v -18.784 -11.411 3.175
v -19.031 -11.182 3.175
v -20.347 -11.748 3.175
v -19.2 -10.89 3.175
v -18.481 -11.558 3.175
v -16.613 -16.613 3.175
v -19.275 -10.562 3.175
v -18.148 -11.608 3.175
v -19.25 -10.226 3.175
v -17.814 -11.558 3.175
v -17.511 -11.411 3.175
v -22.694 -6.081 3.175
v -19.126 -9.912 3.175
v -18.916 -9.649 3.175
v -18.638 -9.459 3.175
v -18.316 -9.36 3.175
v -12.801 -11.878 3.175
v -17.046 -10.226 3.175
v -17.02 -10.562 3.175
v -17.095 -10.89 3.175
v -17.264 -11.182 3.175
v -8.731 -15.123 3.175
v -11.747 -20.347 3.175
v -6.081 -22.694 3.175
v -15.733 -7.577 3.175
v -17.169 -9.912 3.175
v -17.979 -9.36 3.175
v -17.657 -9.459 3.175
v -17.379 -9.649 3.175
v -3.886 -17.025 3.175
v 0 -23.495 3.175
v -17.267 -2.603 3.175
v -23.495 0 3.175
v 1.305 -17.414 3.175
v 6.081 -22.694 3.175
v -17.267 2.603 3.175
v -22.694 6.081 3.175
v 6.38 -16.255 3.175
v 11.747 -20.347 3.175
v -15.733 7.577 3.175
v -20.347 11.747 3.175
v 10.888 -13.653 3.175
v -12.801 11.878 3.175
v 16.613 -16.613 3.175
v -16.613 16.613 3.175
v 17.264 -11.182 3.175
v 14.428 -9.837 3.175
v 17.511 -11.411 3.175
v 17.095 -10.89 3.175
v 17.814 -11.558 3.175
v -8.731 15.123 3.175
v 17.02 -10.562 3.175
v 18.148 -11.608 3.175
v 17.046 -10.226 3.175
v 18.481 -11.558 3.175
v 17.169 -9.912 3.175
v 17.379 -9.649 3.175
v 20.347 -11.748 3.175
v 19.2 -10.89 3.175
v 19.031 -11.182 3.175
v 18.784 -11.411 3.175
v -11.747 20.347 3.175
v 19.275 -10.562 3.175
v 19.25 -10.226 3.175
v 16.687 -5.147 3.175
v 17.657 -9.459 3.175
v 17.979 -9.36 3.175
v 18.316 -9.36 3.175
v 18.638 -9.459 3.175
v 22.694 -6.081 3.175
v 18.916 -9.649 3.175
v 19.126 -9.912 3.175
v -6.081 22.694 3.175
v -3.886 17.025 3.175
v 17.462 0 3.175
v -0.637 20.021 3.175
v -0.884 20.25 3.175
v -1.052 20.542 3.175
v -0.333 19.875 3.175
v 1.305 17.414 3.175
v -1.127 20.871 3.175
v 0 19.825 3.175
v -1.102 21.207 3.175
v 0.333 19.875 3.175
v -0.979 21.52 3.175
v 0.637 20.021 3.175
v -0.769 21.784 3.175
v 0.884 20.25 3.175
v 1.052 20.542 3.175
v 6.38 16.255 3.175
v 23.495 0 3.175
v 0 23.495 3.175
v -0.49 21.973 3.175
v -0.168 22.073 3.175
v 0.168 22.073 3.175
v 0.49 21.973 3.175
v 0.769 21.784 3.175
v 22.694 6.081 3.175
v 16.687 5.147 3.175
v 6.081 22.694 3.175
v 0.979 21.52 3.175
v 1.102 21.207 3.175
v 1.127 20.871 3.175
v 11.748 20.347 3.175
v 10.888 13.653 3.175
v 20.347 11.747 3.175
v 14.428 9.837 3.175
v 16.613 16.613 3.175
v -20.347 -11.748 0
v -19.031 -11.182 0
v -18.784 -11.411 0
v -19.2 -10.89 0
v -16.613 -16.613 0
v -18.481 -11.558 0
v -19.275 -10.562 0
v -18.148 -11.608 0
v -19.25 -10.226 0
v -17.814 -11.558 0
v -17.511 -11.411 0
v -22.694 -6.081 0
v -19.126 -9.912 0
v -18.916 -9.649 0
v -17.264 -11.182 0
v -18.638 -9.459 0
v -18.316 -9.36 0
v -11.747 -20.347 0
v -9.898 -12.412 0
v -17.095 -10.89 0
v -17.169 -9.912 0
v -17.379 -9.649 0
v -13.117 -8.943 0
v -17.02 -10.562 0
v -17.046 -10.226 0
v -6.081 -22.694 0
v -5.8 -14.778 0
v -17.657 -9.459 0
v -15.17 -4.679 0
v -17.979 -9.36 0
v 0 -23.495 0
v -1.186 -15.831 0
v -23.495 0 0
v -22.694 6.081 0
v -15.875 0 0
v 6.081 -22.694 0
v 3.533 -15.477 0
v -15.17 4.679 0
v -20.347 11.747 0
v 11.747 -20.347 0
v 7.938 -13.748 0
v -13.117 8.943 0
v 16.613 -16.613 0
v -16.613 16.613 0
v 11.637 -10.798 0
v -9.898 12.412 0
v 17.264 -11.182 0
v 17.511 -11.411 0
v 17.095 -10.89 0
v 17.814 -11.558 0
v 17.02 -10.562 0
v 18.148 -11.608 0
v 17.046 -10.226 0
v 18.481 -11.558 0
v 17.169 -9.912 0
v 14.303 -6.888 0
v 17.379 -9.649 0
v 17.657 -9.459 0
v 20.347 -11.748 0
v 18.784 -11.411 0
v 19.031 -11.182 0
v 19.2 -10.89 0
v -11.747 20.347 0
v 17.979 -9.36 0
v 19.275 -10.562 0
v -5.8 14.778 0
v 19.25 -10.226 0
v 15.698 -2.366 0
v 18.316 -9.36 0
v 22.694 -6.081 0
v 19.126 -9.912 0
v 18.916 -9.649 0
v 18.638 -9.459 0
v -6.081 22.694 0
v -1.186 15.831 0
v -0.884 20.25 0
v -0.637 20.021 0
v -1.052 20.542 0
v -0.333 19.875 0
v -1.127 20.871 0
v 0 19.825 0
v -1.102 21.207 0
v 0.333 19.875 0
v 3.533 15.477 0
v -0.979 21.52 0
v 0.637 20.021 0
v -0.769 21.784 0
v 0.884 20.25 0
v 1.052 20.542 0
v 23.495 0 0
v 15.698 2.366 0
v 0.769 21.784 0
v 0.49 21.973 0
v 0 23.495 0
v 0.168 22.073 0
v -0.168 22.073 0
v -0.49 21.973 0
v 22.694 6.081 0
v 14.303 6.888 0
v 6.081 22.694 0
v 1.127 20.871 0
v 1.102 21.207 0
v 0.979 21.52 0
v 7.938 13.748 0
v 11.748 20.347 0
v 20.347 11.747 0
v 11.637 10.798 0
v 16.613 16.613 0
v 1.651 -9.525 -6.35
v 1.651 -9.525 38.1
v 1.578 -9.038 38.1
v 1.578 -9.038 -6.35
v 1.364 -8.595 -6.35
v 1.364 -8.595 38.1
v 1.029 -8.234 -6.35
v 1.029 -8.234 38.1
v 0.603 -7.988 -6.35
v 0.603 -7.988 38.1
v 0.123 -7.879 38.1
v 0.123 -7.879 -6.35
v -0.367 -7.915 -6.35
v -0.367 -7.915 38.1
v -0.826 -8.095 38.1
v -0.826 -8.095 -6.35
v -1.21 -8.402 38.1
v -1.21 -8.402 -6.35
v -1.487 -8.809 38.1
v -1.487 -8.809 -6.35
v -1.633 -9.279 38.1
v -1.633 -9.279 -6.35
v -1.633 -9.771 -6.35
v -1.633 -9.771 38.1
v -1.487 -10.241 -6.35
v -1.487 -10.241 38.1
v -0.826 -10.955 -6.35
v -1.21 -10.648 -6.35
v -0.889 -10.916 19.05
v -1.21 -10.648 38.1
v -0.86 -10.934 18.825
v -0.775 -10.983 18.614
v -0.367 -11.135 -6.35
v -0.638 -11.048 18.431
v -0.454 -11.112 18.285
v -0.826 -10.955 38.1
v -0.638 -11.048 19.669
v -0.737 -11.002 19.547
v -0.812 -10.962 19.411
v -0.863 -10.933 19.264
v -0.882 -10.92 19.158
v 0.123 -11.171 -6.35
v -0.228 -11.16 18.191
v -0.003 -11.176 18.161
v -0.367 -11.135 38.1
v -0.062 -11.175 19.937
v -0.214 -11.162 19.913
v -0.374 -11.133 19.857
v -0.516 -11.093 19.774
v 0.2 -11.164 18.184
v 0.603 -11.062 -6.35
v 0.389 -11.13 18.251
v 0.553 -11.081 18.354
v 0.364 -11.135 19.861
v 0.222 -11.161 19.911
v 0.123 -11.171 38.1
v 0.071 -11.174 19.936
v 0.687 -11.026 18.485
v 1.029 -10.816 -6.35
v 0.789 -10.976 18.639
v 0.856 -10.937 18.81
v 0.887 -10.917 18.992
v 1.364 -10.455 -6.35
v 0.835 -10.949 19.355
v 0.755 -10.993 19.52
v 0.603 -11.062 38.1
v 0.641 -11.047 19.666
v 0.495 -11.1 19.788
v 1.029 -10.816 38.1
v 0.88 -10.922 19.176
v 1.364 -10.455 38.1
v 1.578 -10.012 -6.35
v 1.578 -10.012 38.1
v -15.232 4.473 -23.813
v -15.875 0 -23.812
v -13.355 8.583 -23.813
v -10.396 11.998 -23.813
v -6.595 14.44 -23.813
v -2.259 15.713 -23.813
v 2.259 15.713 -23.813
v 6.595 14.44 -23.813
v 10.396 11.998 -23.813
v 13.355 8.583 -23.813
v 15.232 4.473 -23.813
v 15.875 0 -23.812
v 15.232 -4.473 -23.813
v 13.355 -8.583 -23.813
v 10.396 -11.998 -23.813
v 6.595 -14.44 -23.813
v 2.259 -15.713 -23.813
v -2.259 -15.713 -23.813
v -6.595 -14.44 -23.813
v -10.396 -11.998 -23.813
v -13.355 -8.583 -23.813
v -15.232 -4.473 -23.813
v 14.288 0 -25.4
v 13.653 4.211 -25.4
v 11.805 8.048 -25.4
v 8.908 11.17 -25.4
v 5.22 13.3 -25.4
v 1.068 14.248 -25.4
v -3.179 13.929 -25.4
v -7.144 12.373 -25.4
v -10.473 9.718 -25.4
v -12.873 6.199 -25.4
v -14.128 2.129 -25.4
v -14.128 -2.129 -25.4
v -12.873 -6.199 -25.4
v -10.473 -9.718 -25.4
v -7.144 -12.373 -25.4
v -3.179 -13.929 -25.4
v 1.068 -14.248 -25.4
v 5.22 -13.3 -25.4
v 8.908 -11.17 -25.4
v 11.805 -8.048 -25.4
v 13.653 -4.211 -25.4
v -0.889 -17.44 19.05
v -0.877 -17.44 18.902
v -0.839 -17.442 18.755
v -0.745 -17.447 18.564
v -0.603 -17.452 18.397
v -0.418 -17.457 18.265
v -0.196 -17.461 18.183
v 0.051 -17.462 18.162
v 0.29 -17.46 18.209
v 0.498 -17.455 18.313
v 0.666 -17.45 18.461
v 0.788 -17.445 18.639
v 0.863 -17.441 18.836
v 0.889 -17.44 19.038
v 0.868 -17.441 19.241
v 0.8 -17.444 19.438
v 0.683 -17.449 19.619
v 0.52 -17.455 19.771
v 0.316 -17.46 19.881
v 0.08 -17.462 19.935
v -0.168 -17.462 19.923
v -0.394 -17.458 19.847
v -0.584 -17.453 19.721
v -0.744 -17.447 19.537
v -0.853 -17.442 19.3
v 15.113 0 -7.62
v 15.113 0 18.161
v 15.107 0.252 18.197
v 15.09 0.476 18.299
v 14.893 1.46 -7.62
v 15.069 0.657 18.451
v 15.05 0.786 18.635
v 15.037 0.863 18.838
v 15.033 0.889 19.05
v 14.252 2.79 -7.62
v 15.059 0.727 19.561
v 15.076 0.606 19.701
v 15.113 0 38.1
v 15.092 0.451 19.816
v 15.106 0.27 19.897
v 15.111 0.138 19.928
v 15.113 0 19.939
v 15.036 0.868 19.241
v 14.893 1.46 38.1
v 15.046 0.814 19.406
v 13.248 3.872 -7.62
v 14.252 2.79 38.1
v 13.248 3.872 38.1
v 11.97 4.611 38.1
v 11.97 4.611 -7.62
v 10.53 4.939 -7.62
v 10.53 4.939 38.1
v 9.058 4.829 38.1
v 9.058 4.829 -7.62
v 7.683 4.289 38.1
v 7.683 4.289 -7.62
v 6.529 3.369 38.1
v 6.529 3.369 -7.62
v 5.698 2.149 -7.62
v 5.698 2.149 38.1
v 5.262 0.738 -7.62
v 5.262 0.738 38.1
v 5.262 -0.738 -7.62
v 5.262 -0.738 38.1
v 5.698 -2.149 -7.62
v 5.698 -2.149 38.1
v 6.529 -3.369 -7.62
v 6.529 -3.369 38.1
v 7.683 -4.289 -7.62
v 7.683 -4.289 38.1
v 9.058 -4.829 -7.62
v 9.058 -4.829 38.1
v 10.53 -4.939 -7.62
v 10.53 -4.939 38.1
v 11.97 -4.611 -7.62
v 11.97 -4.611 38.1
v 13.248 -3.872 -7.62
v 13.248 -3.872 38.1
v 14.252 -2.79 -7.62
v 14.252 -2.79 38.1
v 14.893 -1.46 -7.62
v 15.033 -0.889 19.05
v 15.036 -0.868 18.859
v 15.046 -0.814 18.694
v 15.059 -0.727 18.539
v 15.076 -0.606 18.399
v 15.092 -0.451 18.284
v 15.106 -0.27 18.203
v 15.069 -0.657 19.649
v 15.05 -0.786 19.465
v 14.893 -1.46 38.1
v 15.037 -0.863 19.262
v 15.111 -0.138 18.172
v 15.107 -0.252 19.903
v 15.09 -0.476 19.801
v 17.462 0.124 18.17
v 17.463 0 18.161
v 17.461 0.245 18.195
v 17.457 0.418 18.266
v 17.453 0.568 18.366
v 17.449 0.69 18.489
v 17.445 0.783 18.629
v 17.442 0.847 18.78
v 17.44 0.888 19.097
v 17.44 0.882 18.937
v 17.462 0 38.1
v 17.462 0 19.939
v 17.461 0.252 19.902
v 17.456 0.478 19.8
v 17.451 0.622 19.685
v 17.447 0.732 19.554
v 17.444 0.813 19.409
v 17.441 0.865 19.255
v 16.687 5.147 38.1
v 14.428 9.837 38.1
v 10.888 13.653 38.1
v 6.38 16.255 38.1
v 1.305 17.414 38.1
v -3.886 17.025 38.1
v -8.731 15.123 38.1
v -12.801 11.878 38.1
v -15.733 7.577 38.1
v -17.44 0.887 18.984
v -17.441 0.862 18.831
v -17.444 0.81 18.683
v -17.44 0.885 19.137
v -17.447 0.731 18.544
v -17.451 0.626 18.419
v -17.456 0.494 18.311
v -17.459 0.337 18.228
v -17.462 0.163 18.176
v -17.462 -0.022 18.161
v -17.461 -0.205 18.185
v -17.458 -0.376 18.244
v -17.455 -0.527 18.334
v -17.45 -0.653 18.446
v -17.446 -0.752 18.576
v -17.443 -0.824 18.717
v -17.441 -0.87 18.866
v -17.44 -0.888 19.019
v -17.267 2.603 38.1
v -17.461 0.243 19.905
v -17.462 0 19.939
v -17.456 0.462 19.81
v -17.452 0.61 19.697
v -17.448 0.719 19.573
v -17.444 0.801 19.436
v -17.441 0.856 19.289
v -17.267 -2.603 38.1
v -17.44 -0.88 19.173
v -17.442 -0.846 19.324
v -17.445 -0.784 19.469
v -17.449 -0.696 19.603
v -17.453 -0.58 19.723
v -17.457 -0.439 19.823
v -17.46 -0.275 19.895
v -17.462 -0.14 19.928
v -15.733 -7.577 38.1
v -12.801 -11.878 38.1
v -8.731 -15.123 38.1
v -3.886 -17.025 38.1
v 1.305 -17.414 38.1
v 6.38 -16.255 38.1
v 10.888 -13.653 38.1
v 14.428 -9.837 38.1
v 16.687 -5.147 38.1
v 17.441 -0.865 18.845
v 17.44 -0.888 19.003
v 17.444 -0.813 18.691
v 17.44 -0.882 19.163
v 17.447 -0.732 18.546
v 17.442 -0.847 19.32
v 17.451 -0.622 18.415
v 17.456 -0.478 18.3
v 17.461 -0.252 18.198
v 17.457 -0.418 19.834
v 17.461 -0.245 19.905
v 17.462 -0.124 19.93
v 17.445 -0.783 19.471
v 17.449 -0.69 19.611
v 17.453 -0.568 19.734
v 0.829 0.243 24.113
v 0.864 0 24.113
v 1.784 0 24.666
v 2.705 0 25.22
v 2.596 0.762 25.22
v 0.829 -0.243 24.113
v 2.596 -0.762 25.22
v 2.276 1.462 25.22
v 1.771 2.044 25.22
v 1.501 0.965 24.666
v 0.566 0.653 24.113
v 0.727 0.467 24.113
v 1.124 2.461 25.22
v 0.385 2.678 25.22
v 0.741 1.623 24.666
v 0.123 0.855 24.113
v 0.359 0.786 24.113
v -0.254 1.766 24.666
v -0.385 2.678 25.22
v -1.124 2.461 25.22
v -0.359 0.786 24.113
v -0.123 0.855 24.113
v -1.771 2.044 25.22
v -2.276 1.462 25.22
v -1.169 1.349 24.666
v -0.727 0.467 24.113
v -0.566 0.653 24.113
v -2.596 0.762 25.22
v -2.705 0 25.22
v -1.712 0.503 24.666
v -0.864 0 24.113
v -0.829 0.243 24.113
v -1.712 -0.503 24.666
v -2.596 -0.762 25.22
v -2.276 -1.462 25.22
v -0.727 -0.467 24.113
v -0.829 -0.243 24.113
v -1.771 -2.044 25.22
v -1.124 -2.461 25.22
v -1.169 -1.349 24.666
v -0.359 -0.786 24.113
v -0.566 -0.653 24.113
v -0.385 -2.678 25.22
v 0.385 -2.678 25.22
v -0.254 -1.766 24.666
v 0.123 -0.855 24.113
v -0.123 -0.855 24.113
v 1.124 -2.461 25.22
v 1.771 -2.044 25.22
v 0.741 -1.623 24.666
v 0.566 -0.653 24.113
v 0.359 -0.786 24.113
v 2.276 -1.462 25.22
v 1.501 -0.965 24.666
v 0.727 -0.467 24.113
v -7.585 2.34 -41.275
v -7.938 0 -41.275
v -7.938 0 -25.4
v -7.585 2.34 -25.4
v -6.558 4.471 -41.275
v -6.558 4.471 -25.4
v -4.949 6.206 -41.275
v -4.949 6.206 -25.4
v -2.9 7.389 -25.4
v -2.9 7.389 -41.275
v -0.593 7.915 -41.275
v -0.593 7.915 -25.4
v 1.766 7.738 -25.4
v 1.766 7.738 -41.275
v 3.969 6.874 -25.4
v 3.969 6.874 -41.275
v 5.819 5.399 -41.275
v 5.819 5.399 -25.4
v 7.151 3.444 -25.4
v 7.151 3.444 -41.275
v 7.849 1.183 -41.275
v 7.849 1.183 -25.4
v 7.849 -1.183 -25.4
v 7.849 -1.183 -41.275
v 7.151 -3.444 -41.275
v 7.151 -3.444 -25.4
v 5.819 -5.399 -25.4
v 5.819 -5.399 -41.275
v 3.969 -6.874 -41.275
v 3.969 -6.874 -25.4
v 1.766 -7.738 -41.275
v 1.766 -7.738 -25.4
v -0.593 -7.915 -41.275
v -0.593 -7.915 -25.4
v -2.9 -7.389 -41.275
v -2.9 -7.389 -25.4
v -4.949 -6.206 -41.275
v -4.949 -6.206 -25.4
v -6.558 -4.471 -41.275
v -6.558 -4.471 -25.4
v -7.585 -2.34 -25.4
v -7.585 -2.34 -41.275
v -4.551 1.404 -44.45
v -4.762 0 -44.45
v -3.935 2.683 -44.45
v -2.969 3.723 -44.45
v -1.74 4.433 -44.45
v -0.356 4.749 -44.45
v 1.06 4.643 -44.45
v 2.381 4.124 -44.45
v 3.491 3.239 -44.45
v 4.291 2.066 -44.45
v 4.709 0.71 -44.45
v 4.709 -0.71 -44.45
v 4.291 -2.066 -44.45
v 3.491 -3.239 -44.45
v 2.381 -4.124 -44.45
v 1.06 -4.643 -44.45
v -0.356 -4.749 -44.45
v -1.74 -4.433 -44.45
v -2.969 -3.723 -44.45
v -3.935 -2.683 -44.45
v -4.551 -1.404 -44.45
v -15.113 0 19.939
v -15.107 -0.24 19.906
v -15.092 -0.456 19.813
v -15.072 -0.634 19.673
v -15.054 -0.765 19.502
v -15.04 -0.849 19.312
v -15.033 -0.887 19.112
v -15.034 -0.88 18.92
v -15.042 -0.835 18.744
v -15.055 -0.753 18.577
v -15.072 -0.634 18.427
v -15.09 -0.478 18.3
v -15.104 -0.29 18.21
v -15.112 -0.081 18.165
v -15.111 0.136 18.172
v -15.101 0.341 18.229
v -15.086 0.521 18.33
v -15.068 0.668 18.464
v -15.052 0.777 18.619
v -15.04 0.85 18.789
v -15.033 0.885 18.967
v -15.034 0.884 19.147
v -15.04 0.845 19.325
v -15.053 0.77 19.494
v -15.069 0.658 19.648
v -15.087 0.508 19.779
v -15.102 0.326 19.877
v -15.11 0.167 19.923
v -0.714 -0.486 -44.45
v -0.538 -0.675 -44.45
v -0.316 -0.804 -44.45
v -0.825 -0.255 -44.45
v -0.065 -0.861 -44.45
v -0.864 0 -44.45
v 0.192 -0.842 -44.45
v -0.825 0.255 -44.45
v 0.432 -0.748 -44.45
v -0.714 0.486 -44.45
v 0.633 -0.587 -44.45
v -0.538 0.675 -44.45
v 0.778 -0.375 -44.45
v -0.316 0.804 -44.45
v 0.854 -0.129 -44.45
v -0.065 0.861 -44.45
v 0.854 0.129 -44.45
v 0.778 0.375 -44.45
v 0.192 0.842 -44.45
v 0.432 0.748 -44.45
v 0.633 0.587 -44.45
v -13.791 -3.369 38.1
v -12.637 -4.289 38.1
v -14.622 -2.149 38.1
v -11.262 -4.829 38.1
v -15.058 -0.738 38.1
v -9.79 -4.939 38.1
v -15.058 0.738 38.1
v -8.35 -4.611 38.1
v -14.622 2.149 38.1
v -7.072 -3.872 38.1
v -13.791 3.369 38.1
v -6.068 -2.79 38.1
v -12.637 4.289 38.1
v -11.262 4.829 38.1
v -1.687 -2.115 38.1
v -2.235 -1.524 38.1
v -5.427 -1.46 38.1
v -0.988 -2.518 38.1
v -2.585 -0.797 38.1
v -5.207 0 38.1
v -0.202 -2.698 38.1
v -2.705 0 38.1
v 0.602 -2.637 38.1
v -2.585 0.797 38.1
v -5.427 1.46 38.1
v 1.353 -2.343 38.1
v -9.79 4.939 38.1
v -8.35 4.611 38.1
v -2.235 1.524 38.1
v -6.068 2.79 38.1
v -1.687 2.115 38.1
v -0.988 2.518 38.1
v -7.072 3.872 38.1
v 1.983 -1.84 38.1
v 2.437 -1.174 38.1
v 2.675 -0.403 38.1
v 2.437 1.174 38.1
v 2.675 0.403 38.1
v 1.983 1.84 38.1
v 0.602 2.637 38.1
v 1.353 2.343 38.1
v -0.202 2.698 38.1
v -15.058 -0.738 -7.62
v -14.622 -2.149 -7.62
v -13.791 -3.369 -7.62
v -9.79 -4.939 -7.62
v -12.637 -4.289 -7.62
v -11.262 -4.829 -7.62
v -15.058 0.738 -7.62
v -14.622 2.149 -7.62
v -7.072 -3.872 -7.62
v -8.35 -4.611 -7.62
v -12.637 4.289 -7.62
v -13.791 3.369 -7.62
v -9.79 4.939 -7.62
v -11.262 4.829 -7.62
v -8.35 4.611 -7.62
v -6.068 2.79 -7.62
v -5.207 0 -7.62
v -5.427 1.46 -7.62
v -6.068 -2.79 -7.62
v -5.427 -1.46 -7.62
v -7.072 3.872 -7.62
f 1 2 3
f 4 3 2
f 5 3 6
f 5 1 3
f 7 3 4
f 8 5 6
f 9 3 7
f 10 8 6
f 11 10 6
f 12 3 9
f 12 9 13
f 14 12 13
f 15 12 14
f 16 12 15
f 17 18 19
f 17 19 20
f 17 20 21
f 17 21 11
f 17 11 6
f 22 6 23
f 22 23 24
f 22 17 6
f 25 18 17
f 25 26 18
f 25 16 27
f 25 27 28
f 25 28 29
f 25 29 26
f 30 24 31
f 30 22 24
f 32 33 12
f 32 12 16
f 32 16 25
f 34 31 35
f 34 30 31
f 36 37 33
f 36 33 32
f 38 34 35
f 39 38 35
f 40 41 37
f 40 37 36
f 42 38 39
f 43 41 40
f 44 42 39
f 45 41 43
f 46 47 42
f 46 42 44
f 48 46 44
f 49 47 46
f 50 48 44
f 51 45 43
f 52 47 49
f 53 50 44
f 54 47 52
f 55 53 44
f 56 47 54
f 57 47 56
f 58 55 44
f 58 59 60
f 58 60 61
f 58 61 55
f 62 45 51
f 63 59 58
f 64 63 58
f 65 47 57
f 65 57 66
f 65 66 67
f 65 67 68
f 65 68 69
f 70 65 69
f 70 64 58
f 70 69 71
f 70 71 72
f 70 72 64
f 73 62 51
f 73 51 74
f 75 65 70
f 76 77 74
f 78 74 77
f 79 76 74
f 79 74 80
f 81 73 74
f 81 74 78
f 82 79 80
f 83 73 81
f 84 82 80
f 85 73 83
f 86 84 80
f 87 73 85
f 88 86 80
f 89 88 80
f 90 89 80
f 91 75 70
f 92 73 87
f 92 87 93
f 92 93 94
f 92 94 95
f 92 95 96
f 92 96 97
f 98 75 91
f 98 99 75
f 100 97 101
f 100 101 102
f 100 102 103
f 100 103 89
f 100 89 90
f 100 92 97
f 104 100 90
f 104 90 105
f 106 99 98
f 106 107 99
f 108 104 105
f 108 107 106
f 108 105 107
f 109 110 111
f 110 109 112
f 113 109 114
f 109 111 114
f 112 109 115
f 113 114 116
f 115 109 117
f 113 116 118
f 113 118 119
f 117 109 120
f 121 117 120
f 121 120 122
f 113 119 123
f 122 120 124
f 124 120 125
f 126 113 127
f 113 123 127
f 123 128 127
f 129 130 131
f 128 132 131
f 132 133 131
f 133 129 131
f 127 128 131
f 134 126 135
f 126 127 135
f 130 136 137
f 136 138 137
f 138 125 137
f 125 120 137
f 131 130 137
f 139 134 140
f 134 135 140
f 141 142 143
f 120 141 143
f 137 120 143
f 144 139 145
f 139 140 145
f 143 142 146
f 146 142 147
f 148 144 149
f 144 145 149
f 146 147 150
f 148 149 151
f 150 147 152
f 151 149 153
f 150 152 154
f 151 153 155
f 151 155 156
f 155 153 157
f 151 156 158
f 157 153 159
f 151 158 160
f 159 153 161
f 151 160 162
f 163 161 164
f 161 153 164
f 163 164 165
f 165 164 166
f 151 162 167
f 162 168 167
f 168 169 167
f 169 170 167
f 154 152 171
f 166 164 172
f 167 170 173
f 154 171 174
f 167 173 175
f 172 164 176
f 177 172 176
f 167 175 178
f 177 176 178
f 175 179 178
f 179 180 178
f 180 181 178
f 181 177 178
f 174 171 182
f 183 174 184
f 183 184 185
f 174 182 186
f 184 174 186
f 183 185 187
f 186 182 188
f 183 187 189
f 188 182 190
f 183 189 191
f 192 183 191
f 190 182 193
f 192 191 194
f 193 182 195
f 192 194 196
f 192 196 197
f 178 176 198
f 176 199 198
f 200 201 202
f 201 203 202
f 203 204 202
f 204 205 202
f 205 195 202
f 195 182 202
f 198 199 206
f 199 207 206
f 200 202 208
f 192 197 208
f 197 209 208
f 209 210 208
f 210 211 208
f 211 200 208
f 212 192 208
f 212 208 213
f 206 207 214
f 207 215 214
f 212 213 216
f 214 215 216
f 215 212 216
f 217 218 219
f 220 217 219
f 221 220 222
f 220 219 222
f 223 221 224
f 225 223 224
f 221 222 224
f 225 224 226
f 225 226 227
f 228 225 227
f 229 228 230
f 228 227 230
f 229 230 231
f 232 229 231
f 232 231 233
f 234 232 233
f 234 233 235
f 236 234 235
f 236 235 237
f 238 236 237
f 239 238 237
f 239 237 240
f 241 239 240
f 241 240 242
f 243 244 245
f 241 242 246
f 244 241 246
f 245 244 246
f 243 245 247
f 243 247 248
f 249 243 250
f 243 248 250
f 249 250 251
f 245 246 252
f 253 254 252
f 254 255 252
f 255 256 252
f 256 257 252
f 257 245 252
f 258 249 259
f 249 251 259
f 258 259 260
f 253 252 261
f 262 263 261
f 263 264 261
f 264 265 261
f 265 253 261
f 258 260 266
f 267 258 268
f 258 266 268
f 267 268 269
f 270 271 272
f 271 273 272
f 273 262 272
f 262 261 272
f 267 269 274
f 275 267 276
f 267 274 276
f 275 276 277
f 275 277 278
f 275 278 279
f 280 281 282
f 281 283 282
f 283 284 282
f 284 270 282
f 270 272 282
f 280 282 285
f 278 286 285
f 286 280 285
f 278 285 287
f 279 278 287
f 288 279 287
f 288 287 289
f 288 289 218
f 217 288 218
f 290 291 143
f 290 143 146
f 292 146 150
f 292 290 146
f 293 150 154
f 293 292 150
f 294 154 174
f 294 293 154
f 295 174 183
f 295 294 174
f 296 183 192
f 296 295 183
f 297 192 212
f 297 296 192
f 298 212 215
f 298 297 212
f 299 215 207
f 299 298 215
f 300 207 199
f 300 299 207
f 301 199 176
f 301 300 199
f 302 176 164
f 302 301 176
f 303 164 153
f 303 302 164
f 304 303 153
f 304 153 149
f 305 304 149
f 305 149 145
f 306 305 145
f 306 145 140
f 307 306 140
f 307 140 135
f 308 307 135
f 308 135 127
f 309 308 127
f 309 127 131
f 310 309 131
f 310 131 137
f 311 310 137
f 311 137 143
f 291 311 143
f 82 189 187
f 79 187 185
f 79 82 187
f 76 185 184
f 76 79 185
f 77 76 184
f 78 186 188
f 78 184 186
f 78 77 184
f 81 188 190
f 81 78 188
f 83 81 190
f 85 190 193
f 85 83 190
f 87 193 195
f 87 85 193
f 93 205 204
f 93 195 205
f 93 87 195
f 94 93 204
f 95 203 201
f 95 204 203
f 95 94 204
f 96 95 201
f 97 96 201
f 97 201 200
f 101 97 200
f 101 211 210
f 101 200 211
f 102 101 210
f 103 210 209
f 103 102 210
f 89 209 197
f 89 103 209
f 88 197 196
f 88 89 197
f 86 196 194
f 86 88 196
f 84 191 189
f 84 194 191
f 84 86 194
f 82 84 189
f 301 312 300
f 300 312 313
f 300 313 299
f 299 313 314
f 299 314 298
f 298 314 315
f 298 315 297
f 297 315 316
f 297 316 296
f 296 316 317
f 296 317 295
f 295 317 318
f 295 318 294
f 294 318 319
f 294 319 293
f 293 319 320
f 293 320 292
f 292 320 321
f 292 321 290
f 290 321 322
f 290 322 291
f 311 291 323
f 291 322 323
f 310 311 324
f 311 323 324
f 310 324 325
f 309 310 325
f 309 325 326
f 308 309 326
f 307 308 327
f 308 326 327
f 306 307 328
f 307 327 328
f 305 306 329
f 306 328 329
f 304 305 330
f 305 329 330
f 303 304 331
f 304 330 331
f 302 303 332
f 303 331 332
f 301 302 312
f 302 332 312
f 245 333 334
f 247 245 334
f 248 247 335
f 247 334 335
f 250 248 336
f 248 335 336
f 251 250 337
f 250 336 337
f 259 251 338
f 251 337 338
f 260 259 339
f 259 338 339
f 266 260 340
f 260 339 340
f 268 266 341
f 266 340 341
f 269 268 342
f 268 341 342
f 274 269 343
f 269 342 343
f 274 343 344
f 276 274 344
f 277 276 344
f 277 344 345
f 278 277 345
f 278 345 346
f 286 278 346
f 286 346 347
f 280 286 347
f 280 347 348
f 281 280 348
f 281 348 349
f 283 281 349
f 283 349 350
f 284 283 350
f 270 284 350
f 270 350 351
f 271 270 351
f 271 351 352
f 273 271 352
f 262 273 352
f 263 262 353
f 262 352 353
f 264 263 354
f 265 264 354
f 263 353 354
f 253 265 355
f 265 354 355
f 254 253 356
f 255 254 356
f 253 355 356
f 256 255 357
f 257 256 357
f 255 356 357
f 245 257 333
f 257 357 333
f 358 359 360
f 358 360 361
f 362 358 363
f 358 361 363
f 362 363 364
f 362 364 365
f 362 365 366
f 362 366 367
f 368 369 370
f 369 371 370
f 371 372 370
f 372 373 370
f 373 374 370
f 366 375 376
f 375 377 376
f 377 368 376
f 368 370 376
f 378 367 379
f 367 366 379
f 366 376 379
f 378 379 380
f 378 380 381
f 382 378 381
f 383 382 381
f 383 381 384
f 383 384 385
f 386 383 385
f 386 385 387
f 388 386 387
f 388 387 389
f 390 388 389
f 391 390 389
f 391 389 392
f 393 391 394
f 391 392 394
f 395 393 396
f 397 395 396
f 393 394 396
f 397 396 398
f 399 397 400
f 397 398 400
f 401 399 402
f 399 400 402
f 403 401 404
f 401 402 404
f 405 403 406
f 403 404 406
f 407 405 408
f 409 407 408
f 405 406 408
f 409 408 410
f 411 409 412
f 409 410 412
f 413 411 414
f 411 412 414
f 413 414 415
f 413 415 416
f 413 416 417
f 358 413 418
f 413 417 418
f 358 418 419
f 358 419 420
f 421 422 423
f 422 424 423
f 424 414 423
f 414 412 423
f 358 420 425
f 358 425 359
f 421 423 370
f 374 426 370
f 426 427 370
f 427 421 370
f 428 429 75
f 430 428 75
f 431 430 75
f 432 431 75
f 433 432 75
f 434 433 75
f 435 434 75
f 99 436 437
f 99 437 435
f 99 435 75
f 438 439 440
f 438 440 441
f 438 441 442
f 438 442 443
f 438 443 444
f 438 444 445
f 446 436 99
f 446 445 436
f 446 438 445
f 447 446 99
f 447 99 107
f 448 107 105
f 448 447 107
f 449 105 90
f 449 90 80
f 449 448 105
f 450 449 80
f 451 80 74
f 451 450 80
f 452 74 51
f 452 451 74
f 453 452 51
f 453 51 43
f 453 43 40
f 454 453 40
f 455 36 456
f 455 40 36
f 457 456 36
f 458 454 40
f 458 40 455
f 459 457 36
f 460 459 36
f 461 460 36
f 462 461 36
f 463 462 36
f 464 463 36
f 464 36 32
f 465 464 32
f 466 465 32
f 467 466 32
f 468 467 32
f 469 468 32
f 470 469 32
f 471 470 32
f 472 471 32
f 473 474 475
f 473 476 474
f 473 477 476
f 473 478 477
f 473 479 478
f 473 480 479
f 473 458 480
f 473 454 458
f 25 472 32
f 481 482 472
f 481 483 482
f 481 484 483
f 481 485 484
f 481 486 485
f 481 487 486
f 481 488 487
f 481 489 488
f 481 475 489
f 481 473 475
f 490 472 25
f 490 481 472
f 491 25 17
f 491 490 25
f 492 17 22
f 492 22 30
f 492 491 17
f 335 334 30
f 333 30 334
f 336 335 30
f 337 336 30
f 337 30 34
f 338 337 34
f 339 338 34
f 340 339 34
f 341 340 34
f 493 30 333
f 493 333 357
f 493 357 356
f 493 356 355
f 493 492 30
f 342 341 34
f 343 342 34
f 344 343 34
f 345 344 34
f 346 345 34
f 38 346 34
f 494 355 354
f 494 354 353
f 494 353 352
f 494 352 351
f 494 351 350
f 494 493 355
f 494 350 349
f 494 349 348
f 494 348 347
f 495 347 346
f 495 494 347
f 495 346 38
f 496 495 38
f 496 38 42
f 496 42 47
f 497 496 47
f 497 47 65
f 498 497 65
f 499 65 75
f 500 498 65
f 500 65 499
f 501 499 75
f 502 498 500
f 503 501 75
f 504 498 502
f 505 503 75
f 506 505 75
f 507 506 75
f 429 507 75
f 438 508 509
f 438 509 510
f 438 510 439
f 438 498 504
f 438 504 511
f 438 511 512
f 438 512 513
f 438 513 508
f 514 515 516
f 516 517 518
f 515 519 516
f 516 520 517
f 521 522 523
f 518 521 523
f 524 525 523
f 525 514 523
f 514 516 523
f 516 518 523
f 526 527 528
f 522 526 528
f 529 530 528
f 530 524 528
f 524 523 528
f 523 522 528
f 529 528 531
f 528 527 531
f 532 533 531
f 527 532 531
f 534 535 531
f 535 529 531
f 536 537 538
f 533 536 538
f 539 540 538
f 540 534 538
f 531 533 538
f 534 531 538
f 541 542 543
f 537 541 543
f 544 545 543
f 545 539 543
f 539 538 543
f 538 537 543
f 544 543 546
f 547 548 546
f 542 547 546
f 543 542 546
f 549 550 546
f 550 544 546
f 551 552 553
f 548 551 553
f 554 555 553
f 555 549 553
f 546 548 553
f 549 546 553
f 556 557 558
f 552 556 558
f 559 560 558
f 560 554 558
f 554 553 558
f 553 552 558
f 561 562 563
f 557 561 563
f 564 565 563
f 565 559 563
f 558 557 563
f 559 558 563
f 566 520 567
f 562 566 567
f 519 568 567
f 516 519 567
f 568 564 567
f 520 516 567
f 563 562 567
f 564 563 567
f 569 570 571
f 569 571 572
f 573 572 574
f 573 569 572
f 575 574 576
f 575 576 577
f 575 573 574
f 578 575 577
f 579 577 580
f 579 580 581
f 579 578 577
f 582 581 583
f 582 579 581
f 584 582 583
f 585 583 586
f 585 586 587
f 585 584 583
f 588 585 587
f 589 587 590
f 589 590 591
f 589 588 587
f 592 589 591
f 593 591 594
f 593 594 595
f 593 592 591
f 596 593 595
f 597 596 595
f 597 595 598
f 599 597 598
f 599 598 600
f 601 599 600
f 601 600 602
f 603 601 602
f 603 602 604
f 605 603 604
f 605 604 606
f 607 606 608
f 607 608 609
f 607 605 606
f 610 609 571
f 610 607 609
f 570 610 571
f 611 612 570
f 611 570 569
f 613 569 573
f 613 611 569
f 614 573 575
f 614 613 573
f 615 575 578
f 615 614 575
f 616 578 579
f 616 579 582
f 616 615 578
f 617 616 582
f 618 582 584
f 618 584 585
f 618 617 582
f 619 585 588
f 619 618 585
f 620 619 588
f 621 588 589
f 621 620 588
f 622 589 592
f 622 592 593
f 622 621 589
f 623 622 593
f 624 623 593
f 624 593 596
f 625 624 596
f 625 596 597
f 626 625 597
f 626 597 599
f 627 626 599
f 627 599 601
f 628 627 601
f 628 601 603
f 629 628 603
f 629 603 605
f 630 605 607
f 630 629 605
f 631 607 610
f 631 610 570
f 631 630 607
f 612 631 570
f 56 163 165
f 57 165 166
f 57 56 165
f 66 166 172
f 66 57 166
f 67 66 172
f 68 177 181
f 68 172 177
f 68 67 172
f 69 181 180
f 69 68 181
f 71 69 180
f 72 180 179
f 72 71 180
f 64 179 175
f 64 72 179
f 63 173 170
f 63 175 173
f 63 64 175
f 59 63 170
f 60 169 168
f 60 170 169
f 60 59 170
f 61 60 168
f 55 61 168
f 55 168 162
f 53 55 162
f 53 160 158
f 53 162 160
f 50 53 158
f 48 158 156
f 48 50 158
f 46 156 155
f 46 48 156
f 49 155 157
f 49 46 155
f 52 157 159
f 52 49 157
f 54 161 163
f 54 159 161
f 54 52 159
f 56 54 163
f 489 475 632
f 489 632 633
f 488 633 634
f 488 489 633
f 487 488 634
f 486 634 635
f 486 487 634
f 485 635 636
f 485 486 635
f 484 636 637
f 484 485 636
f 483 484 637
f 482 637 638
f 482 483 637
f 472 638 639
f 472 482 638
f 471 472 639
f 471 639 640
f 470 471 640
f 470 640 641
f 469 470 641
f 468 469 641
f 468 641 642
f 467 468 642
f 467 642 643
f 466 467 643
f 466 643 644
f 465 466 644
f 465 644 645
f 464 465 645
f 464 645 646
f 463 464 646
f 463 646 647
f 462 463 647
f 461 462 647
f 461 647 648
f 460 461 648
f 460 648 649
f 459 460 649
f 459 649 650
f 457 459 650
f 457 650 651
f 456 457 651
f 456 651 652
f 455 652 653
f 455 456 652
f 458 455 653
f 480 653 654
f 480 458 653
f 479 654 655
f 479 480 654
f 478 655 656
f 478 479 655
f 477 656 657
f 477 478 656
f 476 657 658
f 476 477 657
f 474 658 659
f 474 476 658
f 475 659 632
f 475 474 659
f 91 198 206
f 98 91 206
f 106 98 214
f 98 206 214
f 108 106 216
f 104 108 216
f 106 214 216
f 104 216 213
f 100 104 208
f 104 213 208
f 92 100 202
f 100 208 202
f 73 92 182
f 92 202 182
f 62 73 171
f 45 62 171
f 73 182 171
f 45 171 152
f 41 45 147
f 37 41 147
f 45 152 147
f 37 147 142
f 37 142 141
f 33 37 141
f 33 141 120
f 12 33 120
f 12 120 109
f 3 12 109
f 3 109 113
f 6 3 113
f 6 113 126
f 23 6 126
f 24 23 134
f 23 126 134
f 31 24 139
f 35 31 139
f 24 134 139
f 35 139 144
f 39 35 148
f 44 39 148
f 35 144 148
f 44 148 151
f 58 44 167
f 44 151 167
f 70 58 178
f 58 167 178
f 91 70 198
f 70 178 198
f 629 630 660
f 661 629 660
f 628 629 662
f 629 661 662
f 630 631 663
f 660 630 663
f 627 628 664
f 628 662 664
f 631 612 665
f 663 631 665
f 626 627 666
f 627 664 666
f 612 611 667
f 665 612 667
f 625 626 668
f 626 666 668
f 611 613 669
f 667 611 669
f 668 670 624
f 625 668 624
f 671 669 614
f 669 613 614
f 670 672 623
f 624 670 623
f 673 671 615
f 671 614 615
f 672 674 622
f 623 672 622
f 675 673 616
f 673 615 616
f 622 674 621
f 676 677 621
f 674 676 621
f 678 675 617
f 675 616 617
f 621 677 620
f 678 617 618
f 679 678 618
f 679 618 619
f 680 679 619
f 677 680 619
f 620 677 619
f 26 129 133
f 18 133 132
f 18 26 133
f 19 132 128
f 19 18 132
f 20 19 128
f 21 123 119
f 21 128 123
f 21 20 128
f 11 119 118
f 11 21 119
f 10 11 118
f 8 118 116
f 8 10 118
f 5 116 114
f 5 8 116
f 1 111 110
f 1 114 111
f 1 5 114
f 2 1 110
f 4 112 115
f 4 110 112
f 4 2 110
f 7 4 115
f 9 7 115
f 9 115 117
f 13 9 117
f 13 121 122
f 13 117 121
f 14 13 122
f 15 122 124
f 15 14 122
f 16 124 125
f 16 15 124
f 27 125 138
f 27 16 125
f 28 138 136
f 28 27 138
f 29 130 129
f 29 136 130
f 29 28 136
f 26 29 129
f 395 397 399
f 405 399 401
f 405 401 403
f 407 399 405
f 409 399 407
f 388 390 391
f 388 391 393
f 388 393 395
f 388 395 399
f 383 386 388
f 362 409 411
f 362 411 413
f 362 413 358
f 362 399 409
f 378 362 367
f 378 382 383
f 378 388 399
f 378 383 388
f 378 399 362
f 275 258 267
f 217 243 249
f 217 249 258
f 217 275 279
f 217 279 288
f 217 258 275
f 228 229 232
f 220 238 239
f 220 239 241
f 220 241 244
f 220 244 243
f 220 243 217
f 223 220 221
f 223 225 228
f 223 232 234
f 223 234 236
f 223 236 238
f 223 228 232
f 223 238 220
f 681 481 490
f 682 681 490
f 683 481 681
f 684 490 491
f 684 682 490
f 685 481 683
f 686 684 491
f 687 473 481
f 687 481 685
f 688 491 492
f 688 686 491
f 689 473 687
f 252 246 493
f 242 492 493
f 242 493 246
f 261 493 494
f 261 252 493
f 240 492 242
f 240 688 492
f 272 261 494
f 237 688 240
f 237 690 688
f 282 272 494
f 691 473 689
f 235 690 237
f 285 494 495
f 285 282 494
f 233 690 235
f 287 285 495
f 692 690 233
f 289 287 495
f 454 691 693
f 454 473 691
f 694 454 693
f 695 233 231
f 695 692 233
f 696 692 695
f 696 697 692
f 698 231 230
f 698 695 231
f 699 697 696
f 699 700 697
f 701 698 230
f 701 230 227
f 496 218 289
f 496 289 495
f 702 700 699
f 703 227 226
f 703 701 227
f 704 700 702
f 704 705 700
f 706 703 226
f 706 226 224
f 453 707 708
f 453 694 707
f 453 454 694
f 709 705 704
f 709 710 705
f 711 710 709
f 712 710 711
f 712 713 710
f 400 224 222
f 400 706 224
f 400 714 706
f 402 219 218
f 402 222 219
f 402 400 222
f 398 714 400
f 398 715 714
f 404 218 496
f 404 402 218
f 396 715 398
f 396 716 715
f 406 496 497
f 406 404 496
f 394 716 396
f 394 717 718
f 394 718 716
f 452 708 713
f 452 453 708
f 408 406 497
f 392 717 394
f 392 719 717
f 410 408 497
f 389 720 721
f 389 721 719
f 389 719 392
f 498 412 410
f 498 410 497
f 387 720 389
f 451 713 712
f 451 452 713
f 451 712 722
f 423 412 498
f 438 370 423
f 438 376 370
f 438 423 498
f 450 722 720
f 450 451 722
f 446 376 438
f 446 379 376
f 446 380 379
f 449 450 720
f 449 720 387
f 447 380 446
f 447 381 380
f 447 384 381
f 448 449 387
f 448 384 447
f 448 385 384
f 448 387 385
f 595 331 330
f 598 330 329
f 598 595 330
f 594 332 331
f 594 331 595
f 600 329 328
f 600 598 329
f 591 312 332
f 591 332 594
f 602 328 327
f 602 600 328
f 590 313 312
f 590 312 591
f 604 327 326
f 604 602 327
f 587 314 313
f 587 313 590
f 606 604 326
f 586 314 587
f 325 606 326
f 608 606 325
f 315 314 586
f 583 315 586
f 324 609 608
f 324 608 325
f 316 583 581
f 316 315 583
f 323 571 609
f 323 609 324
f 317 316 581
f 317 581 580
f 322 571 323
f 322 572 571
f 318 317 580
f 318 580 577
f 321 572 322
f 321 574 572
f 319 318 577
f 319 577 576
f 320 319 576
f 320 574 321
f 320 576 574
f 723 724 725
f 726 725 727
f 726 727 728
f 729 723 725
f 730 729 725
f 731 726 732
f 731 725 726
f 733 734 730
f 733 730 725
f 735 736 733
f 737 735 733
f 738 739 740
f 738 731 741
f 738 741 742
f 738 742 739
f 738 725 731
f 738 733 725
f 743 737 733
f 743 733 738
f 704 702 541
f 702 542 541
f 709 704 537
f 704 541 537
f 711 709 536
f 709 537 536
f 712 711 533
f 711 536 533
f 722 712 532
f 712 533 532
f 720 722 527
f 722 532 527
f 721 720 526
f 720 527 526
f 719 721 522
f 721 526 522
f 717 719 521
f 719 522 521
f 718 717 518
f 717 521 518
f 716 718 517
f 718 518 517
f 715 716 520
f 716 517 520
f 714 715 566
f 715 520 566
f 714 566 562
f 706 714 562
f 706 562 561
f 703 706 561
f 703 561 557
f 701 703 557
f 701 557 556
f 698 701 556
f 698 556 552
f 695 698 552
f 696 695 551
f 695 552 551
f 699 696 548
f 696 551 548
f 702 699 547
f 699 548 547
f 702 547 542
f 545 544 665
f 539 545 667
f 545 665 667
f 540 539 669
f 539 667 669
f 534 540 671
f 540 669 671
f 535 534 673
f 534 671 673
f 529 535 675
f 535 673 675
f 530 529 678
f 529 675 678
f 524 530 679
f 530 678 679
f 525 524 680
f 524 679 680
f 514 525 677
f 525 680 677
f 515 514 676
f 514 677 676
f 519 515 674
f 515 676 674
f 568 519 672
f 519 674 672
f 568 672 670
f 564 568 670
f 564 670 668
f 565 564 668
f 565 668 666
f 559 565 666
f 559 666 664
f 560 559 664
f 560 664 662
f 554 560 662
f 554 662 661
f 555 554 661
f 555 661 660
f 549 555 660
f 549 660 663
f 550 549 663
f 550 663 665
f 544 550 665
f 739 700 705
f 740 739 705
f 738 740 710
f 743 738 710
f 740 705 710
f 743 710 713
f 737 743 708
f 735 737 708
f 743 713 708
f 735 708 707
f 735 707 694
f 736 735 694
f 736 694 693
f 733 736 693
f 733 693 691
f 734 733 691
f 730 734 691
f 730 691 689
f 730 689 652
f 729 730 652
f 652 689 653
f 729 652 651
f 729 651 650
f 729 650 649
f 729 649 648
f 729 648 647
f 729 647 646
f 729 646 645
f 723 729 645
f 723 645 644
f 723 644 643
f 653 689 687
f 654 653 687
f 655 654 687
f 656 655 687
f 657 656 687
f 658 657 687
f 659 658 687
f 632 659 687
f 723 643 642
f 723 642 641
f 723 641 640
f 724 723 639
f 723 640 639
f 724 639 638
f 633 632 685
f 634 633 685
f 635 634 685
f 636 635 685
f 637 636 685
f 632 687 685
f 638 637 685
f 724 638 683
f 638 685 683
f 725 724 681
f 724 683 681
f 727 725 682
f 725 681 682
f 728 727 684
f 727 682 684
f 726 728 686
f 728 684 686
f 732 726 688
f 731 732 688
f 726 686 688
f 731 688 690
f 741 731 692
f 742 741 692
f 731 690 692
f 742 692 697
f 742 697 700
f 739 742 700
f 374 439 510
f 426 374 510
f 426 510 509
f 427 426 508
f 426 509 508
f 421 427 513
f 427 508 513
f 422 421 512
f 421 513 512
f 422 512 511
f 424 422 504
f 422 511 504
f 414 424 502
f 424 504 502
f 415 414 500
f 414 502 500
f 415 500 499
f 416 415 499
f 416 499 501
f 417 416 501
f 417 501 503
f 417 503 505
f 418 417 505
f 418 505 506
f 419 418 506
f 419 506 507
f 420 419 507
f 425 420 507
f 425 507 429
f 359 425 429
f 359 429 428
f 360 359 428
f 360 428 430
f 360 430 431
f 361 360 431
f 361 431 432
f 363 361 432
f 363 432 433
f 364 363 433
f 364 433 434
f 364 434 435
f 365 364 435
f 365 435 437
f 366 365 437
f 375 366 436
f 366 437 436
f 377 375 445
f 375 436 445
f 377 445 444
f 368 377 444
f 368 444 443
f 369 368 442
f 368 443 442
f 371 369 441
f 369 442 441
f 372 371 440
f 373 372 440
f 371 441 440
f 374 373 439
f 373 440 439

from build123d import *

# Parameters (mm, degrees)
SKETCH1_R                   = 25.4
BOSS_EXTRUDE1_DEPTH         = 38.1
BOSS_EXTRUDE1_DEPTH_BACK    = 44.45
SKETCH2_OUTSIDE_W           = 74.686
SKETCH2_OUTSIDE_H           = 74.686
SKETCH2_OUTSIDE_R           = 17.4625
CUT_EXTRUDE3_DEPTH          = 63.5
SKETCH3_R                   = 23.495
BOSS_EXTRUDE2_DEPTH         = 3.175
F_1_4_28_TAPPED_HOLE1_D     = 5.4102
F_1_4_28_TAPPED_HOLE1_DEPTH = 12.88034
F_1_4_28_TAPPED_HOLE1_TIP   = 1.625388061
SKETCH9_R                   = 0.8636
CUT_EXTRUDE4_DEPTH          = 91.02678768
SKETCH12_R                  = 4.953
CUT_EXTRUDE5_DEPTH          = 45.72
SKETCH17_R                  = 1.651
CUT_EXTRUDE7_DEPTH          = 44.45
SKETCH22_OUTSIDE_W          = 74.686
SKETCH22_OUTSIDE_H          = 74.686
SKETCH22_OUTSIDE_R          = 7.9375
CUT_EXTRUDE9_DEPTH          = 19.05
CHAMFER1_SIZE               = 3.175
F_2_56_TAPPED_HOLE3_REACH   = 81.131
F_2_56_TAPPED_HOLE3_BORE_R  = 0.889
F_2_56_TAPPED_HOLE4_REACH   = 81.131
F_2_56_TAPPED_HOLE4_BORE_R  = 0.889
CIRPATTERN1_COUNT           = 3
SKETCH25_OUTSIDE_W          = 70.184
SKETCH25_OUTSIDE_H          = 70.184
SKETCH25_OUTSIDE_R          = 15.875
CUT_EXTRUDE10_DEPTH         = 25.4


with BuildPart() as part:
    # Sketch1 → Boss-Extrude1 (new, two sides)
    with BuildSketch(Plane.XY) as boss_extrude1_sk:
        Circle(SKETCH1_R)
    extrude(amount=BOSS_EXTRUDE1_DEPTH)
    extrude(boss_extrude1_sk.sketch, amount=-BOSS_EXTRUDE1_DEPTH_BACK)

    # Sketch2 outside → Cut-Extrude3 (cut)
    with BuildSketch(Plane.XY.offset(38.1)):
        Rectangle(SKETCH2_OUTSIDE_W, SKETCH2_OUTSIDE_H)
        Circle(SKETCH2_OUTSIDE_R, mode=Mode.SUBTRACT)
    extrude(amount=-CUT_EXTRUDE3_DEPTH, mode=Mode.SUBTRACT)

    # Sketch3 → Boss-Extrude2 (add)
    with BuildSketch(Plane.XY):
        Circle(SKETCH3_R)
    extrude(amount=BOSS_EXTRUDE2_DEPTH)

    # 1/4-28 Tapped Hole1
    with Locations(Plane.XY.offset(38.1)):
        with Locations((0, 0)):
            Hole(F_1_4_28_TAPPED_HOLE1_D / 2, depth=F_1_4_28_TAPPED_HOLE1_DEPTH)
            with Locations((0, 0, -(F_1_4_28_TAPPED_HOLE1_DEPTH + F_1_4_28_TAPPED_HOLE1_TIP / 2))):  # 118° drill point
                Cone(0, F_1_4_28_TAPPED_HOLE1_D / 2, F_1_4_28_TAPPED_HOLE1_TIP, mode=Mode.SUBTRACT)

    # Sketch6 → #2 Clearance Hole1 (revolve, cut)
    with BuildSketch(Plane(origin=(0, 20.955, 3.175), x_dir=(0, -1, 0), z_dir=(1, 0, 0))):
        Polygon((0, 0), (0, 13.559492758), (1.1303, 12.88034), (1.1303, 0), align=None)
    f_2_clearance_hole1 = revolve(axis=Axis((0, 20.955, 9.525), (0, 0, -1)), mode=Mode.SUBTRACT)

    # Sketch9 → Cut-Extrude4 (cut, through all)
    with BuildSketch(Plane(origin=(0, 0, -44.45), x_dir=(-1, 0, 0), z_dir=(0, 0, -1))):
        Circle(SKETCH9_R)
    extrude(amount=-CUT_EXTRUDE4_DEPTH, mode=Mode.SUBTRACT)

    # Sketch12 → Cut-Extrude5 (cut)
    with BuildSketch(Plane.XY.offset(38.1)):
        with Locations((-10.16, 0)):
            Circle(SKETCH12_R)
        with Locations((10.16, 0)):
            Circle(SKETCH12_R)
    extrude(amount=-CUT_EXTRUDE5_DEPTH, mode=Mode.SUBTRACT)

    # Sketch17 → Cut-Extrude7 (cut)
    with BuildSketch(Plane.XY.offset(38.1)):
        with Locations((0, -9.525)):
            Circle(SKETCH17_R)
    extrude(amount=-CUT_EXTRUDE7_DEPTH, mode=Mode.SUBTRACT)

    # Sketch22 outside → Cut-Extrude9 (cut)
    with BuildSketch(Plane(origin=(0, 0, -44.45), x_dir=(-1, 0, 0), z_dir=(0, 0, -1))):
        Rectangle(SKETCH22_OUTSIDE_W, SKETCH22_OUTSIDE_H)
        Circle(SKETCH22_OUTSIDE_R, mode=Mode.SUBTRACT)
    extrude(amount=-CUT_EXTRUDE9_DEPTH, mode=Mode.SUBTRACT)

    # Chamfer1
    chamfer1_edges = [part.edges().sort_by_distance(p)[0] for p in [
        (-17.4625, 0, -25.4),
        (7.9375, 0, -44.45),
    ]]
    chamfer(chamfer1_edges, length=CHAMFER1_SIZE)

    # #2-56 Tapped Hole3 bore (on position points) → #2-56 Tapped Hole3 (cut, up to next)
    with BuildSketch(Plane(origin=(0, -17.4625, 19.05), x_dir=(-1, 0, 0), z_dir=(0, -1, 0)), mode=Mode.PRIVATE) as f_2_56_tapped_hole3_sk1:
        Circle(F_2_56_TAPPED_HOLE3_BORE_R)
    f_2_56_tapped_hole3_tool1 = extrude(f_2_56_tapped_hole3_sk1.sketch, amount=-F_2_56_TAPPED_HOLE3_REACH, mode=Mode.PRIVATE) & part.part
    add(f_2_56_tapped_hole3_tool1.solids().sort_by_distance((0, -17.4625, 19.05))[0], mode=Mode.SUBTRACT)

    # #2-56 Tapped Hole4 bore (on position points) → #2-56 Tapped Hole4 (cut, up to next)
    with BuildSketch(Plane(origin=(17.4625, 0, 19.05), x_dir=(0, 0, 1), z_dir=(1, 0, 0)), mode=Mode.PRIVATE) as f_2_56_tapped_hole4_sk1:
        Circle(F_2_56_TAPPED_HOLE4_BORE_R)
    f_2_56_tapped_hole4_tool1 = extrude(f_2_56_tapped_hole4_sk1.sketch, amount=-F_2_56_TAPPED_HOLE4_REACH, mode=Mode.PRIVATE) & part.part
    f_2_56_tapped_hole4 = f_2_56_tapped_hole4_tool1.solids().sort_by_distance((17.4625, 0, 19.05))[0]
    add(f_2_56_tapped_hole4, mode=Mode.SUBTRACT)

    # Mirror2: #2-56 Tapped Hole4 across plane
    add(f_2_56_tapped_hole4.mirror(Plane(origin=(0, 0, 0), x_dir=(0, 0, 1), z_dir=(1, 0, 0))), mode=Mode.SUBTRACT)

    # CirPattern1: #2 Clearance Hole1 ×3 about axis
    cirpattern1_axis = Axis((0, 0, 0), (0, 0, 1))
    for i in range(1, CIRPATTERN1_COUNT):
        add(f_2_clearance_hole1.rotate(cirpattern1_axis, i * 360 / CIRPATTERN1_COUNT), mode=Mode.SUBTRACT)

    # Sketch25 outside → Cut-Extrude10 (cut)
    with BuildSketch(Plane(origin=(0, 0, -25.4), x_dir=(-1, 0, 0), z_dir=(0, 0, -1))):
        Rectangle(SKETCH25_OUTSIDE_W, SKETCH25_OUTSIDE_H)
        Circle(SKETCH25_OUTSIDE_R, mode=Mode.SUBTRACT)
    extrude(amount=-CUT_EXTRUDE10_DEPTH, mode=Mode.SUBTRACT)


solid = part.part
